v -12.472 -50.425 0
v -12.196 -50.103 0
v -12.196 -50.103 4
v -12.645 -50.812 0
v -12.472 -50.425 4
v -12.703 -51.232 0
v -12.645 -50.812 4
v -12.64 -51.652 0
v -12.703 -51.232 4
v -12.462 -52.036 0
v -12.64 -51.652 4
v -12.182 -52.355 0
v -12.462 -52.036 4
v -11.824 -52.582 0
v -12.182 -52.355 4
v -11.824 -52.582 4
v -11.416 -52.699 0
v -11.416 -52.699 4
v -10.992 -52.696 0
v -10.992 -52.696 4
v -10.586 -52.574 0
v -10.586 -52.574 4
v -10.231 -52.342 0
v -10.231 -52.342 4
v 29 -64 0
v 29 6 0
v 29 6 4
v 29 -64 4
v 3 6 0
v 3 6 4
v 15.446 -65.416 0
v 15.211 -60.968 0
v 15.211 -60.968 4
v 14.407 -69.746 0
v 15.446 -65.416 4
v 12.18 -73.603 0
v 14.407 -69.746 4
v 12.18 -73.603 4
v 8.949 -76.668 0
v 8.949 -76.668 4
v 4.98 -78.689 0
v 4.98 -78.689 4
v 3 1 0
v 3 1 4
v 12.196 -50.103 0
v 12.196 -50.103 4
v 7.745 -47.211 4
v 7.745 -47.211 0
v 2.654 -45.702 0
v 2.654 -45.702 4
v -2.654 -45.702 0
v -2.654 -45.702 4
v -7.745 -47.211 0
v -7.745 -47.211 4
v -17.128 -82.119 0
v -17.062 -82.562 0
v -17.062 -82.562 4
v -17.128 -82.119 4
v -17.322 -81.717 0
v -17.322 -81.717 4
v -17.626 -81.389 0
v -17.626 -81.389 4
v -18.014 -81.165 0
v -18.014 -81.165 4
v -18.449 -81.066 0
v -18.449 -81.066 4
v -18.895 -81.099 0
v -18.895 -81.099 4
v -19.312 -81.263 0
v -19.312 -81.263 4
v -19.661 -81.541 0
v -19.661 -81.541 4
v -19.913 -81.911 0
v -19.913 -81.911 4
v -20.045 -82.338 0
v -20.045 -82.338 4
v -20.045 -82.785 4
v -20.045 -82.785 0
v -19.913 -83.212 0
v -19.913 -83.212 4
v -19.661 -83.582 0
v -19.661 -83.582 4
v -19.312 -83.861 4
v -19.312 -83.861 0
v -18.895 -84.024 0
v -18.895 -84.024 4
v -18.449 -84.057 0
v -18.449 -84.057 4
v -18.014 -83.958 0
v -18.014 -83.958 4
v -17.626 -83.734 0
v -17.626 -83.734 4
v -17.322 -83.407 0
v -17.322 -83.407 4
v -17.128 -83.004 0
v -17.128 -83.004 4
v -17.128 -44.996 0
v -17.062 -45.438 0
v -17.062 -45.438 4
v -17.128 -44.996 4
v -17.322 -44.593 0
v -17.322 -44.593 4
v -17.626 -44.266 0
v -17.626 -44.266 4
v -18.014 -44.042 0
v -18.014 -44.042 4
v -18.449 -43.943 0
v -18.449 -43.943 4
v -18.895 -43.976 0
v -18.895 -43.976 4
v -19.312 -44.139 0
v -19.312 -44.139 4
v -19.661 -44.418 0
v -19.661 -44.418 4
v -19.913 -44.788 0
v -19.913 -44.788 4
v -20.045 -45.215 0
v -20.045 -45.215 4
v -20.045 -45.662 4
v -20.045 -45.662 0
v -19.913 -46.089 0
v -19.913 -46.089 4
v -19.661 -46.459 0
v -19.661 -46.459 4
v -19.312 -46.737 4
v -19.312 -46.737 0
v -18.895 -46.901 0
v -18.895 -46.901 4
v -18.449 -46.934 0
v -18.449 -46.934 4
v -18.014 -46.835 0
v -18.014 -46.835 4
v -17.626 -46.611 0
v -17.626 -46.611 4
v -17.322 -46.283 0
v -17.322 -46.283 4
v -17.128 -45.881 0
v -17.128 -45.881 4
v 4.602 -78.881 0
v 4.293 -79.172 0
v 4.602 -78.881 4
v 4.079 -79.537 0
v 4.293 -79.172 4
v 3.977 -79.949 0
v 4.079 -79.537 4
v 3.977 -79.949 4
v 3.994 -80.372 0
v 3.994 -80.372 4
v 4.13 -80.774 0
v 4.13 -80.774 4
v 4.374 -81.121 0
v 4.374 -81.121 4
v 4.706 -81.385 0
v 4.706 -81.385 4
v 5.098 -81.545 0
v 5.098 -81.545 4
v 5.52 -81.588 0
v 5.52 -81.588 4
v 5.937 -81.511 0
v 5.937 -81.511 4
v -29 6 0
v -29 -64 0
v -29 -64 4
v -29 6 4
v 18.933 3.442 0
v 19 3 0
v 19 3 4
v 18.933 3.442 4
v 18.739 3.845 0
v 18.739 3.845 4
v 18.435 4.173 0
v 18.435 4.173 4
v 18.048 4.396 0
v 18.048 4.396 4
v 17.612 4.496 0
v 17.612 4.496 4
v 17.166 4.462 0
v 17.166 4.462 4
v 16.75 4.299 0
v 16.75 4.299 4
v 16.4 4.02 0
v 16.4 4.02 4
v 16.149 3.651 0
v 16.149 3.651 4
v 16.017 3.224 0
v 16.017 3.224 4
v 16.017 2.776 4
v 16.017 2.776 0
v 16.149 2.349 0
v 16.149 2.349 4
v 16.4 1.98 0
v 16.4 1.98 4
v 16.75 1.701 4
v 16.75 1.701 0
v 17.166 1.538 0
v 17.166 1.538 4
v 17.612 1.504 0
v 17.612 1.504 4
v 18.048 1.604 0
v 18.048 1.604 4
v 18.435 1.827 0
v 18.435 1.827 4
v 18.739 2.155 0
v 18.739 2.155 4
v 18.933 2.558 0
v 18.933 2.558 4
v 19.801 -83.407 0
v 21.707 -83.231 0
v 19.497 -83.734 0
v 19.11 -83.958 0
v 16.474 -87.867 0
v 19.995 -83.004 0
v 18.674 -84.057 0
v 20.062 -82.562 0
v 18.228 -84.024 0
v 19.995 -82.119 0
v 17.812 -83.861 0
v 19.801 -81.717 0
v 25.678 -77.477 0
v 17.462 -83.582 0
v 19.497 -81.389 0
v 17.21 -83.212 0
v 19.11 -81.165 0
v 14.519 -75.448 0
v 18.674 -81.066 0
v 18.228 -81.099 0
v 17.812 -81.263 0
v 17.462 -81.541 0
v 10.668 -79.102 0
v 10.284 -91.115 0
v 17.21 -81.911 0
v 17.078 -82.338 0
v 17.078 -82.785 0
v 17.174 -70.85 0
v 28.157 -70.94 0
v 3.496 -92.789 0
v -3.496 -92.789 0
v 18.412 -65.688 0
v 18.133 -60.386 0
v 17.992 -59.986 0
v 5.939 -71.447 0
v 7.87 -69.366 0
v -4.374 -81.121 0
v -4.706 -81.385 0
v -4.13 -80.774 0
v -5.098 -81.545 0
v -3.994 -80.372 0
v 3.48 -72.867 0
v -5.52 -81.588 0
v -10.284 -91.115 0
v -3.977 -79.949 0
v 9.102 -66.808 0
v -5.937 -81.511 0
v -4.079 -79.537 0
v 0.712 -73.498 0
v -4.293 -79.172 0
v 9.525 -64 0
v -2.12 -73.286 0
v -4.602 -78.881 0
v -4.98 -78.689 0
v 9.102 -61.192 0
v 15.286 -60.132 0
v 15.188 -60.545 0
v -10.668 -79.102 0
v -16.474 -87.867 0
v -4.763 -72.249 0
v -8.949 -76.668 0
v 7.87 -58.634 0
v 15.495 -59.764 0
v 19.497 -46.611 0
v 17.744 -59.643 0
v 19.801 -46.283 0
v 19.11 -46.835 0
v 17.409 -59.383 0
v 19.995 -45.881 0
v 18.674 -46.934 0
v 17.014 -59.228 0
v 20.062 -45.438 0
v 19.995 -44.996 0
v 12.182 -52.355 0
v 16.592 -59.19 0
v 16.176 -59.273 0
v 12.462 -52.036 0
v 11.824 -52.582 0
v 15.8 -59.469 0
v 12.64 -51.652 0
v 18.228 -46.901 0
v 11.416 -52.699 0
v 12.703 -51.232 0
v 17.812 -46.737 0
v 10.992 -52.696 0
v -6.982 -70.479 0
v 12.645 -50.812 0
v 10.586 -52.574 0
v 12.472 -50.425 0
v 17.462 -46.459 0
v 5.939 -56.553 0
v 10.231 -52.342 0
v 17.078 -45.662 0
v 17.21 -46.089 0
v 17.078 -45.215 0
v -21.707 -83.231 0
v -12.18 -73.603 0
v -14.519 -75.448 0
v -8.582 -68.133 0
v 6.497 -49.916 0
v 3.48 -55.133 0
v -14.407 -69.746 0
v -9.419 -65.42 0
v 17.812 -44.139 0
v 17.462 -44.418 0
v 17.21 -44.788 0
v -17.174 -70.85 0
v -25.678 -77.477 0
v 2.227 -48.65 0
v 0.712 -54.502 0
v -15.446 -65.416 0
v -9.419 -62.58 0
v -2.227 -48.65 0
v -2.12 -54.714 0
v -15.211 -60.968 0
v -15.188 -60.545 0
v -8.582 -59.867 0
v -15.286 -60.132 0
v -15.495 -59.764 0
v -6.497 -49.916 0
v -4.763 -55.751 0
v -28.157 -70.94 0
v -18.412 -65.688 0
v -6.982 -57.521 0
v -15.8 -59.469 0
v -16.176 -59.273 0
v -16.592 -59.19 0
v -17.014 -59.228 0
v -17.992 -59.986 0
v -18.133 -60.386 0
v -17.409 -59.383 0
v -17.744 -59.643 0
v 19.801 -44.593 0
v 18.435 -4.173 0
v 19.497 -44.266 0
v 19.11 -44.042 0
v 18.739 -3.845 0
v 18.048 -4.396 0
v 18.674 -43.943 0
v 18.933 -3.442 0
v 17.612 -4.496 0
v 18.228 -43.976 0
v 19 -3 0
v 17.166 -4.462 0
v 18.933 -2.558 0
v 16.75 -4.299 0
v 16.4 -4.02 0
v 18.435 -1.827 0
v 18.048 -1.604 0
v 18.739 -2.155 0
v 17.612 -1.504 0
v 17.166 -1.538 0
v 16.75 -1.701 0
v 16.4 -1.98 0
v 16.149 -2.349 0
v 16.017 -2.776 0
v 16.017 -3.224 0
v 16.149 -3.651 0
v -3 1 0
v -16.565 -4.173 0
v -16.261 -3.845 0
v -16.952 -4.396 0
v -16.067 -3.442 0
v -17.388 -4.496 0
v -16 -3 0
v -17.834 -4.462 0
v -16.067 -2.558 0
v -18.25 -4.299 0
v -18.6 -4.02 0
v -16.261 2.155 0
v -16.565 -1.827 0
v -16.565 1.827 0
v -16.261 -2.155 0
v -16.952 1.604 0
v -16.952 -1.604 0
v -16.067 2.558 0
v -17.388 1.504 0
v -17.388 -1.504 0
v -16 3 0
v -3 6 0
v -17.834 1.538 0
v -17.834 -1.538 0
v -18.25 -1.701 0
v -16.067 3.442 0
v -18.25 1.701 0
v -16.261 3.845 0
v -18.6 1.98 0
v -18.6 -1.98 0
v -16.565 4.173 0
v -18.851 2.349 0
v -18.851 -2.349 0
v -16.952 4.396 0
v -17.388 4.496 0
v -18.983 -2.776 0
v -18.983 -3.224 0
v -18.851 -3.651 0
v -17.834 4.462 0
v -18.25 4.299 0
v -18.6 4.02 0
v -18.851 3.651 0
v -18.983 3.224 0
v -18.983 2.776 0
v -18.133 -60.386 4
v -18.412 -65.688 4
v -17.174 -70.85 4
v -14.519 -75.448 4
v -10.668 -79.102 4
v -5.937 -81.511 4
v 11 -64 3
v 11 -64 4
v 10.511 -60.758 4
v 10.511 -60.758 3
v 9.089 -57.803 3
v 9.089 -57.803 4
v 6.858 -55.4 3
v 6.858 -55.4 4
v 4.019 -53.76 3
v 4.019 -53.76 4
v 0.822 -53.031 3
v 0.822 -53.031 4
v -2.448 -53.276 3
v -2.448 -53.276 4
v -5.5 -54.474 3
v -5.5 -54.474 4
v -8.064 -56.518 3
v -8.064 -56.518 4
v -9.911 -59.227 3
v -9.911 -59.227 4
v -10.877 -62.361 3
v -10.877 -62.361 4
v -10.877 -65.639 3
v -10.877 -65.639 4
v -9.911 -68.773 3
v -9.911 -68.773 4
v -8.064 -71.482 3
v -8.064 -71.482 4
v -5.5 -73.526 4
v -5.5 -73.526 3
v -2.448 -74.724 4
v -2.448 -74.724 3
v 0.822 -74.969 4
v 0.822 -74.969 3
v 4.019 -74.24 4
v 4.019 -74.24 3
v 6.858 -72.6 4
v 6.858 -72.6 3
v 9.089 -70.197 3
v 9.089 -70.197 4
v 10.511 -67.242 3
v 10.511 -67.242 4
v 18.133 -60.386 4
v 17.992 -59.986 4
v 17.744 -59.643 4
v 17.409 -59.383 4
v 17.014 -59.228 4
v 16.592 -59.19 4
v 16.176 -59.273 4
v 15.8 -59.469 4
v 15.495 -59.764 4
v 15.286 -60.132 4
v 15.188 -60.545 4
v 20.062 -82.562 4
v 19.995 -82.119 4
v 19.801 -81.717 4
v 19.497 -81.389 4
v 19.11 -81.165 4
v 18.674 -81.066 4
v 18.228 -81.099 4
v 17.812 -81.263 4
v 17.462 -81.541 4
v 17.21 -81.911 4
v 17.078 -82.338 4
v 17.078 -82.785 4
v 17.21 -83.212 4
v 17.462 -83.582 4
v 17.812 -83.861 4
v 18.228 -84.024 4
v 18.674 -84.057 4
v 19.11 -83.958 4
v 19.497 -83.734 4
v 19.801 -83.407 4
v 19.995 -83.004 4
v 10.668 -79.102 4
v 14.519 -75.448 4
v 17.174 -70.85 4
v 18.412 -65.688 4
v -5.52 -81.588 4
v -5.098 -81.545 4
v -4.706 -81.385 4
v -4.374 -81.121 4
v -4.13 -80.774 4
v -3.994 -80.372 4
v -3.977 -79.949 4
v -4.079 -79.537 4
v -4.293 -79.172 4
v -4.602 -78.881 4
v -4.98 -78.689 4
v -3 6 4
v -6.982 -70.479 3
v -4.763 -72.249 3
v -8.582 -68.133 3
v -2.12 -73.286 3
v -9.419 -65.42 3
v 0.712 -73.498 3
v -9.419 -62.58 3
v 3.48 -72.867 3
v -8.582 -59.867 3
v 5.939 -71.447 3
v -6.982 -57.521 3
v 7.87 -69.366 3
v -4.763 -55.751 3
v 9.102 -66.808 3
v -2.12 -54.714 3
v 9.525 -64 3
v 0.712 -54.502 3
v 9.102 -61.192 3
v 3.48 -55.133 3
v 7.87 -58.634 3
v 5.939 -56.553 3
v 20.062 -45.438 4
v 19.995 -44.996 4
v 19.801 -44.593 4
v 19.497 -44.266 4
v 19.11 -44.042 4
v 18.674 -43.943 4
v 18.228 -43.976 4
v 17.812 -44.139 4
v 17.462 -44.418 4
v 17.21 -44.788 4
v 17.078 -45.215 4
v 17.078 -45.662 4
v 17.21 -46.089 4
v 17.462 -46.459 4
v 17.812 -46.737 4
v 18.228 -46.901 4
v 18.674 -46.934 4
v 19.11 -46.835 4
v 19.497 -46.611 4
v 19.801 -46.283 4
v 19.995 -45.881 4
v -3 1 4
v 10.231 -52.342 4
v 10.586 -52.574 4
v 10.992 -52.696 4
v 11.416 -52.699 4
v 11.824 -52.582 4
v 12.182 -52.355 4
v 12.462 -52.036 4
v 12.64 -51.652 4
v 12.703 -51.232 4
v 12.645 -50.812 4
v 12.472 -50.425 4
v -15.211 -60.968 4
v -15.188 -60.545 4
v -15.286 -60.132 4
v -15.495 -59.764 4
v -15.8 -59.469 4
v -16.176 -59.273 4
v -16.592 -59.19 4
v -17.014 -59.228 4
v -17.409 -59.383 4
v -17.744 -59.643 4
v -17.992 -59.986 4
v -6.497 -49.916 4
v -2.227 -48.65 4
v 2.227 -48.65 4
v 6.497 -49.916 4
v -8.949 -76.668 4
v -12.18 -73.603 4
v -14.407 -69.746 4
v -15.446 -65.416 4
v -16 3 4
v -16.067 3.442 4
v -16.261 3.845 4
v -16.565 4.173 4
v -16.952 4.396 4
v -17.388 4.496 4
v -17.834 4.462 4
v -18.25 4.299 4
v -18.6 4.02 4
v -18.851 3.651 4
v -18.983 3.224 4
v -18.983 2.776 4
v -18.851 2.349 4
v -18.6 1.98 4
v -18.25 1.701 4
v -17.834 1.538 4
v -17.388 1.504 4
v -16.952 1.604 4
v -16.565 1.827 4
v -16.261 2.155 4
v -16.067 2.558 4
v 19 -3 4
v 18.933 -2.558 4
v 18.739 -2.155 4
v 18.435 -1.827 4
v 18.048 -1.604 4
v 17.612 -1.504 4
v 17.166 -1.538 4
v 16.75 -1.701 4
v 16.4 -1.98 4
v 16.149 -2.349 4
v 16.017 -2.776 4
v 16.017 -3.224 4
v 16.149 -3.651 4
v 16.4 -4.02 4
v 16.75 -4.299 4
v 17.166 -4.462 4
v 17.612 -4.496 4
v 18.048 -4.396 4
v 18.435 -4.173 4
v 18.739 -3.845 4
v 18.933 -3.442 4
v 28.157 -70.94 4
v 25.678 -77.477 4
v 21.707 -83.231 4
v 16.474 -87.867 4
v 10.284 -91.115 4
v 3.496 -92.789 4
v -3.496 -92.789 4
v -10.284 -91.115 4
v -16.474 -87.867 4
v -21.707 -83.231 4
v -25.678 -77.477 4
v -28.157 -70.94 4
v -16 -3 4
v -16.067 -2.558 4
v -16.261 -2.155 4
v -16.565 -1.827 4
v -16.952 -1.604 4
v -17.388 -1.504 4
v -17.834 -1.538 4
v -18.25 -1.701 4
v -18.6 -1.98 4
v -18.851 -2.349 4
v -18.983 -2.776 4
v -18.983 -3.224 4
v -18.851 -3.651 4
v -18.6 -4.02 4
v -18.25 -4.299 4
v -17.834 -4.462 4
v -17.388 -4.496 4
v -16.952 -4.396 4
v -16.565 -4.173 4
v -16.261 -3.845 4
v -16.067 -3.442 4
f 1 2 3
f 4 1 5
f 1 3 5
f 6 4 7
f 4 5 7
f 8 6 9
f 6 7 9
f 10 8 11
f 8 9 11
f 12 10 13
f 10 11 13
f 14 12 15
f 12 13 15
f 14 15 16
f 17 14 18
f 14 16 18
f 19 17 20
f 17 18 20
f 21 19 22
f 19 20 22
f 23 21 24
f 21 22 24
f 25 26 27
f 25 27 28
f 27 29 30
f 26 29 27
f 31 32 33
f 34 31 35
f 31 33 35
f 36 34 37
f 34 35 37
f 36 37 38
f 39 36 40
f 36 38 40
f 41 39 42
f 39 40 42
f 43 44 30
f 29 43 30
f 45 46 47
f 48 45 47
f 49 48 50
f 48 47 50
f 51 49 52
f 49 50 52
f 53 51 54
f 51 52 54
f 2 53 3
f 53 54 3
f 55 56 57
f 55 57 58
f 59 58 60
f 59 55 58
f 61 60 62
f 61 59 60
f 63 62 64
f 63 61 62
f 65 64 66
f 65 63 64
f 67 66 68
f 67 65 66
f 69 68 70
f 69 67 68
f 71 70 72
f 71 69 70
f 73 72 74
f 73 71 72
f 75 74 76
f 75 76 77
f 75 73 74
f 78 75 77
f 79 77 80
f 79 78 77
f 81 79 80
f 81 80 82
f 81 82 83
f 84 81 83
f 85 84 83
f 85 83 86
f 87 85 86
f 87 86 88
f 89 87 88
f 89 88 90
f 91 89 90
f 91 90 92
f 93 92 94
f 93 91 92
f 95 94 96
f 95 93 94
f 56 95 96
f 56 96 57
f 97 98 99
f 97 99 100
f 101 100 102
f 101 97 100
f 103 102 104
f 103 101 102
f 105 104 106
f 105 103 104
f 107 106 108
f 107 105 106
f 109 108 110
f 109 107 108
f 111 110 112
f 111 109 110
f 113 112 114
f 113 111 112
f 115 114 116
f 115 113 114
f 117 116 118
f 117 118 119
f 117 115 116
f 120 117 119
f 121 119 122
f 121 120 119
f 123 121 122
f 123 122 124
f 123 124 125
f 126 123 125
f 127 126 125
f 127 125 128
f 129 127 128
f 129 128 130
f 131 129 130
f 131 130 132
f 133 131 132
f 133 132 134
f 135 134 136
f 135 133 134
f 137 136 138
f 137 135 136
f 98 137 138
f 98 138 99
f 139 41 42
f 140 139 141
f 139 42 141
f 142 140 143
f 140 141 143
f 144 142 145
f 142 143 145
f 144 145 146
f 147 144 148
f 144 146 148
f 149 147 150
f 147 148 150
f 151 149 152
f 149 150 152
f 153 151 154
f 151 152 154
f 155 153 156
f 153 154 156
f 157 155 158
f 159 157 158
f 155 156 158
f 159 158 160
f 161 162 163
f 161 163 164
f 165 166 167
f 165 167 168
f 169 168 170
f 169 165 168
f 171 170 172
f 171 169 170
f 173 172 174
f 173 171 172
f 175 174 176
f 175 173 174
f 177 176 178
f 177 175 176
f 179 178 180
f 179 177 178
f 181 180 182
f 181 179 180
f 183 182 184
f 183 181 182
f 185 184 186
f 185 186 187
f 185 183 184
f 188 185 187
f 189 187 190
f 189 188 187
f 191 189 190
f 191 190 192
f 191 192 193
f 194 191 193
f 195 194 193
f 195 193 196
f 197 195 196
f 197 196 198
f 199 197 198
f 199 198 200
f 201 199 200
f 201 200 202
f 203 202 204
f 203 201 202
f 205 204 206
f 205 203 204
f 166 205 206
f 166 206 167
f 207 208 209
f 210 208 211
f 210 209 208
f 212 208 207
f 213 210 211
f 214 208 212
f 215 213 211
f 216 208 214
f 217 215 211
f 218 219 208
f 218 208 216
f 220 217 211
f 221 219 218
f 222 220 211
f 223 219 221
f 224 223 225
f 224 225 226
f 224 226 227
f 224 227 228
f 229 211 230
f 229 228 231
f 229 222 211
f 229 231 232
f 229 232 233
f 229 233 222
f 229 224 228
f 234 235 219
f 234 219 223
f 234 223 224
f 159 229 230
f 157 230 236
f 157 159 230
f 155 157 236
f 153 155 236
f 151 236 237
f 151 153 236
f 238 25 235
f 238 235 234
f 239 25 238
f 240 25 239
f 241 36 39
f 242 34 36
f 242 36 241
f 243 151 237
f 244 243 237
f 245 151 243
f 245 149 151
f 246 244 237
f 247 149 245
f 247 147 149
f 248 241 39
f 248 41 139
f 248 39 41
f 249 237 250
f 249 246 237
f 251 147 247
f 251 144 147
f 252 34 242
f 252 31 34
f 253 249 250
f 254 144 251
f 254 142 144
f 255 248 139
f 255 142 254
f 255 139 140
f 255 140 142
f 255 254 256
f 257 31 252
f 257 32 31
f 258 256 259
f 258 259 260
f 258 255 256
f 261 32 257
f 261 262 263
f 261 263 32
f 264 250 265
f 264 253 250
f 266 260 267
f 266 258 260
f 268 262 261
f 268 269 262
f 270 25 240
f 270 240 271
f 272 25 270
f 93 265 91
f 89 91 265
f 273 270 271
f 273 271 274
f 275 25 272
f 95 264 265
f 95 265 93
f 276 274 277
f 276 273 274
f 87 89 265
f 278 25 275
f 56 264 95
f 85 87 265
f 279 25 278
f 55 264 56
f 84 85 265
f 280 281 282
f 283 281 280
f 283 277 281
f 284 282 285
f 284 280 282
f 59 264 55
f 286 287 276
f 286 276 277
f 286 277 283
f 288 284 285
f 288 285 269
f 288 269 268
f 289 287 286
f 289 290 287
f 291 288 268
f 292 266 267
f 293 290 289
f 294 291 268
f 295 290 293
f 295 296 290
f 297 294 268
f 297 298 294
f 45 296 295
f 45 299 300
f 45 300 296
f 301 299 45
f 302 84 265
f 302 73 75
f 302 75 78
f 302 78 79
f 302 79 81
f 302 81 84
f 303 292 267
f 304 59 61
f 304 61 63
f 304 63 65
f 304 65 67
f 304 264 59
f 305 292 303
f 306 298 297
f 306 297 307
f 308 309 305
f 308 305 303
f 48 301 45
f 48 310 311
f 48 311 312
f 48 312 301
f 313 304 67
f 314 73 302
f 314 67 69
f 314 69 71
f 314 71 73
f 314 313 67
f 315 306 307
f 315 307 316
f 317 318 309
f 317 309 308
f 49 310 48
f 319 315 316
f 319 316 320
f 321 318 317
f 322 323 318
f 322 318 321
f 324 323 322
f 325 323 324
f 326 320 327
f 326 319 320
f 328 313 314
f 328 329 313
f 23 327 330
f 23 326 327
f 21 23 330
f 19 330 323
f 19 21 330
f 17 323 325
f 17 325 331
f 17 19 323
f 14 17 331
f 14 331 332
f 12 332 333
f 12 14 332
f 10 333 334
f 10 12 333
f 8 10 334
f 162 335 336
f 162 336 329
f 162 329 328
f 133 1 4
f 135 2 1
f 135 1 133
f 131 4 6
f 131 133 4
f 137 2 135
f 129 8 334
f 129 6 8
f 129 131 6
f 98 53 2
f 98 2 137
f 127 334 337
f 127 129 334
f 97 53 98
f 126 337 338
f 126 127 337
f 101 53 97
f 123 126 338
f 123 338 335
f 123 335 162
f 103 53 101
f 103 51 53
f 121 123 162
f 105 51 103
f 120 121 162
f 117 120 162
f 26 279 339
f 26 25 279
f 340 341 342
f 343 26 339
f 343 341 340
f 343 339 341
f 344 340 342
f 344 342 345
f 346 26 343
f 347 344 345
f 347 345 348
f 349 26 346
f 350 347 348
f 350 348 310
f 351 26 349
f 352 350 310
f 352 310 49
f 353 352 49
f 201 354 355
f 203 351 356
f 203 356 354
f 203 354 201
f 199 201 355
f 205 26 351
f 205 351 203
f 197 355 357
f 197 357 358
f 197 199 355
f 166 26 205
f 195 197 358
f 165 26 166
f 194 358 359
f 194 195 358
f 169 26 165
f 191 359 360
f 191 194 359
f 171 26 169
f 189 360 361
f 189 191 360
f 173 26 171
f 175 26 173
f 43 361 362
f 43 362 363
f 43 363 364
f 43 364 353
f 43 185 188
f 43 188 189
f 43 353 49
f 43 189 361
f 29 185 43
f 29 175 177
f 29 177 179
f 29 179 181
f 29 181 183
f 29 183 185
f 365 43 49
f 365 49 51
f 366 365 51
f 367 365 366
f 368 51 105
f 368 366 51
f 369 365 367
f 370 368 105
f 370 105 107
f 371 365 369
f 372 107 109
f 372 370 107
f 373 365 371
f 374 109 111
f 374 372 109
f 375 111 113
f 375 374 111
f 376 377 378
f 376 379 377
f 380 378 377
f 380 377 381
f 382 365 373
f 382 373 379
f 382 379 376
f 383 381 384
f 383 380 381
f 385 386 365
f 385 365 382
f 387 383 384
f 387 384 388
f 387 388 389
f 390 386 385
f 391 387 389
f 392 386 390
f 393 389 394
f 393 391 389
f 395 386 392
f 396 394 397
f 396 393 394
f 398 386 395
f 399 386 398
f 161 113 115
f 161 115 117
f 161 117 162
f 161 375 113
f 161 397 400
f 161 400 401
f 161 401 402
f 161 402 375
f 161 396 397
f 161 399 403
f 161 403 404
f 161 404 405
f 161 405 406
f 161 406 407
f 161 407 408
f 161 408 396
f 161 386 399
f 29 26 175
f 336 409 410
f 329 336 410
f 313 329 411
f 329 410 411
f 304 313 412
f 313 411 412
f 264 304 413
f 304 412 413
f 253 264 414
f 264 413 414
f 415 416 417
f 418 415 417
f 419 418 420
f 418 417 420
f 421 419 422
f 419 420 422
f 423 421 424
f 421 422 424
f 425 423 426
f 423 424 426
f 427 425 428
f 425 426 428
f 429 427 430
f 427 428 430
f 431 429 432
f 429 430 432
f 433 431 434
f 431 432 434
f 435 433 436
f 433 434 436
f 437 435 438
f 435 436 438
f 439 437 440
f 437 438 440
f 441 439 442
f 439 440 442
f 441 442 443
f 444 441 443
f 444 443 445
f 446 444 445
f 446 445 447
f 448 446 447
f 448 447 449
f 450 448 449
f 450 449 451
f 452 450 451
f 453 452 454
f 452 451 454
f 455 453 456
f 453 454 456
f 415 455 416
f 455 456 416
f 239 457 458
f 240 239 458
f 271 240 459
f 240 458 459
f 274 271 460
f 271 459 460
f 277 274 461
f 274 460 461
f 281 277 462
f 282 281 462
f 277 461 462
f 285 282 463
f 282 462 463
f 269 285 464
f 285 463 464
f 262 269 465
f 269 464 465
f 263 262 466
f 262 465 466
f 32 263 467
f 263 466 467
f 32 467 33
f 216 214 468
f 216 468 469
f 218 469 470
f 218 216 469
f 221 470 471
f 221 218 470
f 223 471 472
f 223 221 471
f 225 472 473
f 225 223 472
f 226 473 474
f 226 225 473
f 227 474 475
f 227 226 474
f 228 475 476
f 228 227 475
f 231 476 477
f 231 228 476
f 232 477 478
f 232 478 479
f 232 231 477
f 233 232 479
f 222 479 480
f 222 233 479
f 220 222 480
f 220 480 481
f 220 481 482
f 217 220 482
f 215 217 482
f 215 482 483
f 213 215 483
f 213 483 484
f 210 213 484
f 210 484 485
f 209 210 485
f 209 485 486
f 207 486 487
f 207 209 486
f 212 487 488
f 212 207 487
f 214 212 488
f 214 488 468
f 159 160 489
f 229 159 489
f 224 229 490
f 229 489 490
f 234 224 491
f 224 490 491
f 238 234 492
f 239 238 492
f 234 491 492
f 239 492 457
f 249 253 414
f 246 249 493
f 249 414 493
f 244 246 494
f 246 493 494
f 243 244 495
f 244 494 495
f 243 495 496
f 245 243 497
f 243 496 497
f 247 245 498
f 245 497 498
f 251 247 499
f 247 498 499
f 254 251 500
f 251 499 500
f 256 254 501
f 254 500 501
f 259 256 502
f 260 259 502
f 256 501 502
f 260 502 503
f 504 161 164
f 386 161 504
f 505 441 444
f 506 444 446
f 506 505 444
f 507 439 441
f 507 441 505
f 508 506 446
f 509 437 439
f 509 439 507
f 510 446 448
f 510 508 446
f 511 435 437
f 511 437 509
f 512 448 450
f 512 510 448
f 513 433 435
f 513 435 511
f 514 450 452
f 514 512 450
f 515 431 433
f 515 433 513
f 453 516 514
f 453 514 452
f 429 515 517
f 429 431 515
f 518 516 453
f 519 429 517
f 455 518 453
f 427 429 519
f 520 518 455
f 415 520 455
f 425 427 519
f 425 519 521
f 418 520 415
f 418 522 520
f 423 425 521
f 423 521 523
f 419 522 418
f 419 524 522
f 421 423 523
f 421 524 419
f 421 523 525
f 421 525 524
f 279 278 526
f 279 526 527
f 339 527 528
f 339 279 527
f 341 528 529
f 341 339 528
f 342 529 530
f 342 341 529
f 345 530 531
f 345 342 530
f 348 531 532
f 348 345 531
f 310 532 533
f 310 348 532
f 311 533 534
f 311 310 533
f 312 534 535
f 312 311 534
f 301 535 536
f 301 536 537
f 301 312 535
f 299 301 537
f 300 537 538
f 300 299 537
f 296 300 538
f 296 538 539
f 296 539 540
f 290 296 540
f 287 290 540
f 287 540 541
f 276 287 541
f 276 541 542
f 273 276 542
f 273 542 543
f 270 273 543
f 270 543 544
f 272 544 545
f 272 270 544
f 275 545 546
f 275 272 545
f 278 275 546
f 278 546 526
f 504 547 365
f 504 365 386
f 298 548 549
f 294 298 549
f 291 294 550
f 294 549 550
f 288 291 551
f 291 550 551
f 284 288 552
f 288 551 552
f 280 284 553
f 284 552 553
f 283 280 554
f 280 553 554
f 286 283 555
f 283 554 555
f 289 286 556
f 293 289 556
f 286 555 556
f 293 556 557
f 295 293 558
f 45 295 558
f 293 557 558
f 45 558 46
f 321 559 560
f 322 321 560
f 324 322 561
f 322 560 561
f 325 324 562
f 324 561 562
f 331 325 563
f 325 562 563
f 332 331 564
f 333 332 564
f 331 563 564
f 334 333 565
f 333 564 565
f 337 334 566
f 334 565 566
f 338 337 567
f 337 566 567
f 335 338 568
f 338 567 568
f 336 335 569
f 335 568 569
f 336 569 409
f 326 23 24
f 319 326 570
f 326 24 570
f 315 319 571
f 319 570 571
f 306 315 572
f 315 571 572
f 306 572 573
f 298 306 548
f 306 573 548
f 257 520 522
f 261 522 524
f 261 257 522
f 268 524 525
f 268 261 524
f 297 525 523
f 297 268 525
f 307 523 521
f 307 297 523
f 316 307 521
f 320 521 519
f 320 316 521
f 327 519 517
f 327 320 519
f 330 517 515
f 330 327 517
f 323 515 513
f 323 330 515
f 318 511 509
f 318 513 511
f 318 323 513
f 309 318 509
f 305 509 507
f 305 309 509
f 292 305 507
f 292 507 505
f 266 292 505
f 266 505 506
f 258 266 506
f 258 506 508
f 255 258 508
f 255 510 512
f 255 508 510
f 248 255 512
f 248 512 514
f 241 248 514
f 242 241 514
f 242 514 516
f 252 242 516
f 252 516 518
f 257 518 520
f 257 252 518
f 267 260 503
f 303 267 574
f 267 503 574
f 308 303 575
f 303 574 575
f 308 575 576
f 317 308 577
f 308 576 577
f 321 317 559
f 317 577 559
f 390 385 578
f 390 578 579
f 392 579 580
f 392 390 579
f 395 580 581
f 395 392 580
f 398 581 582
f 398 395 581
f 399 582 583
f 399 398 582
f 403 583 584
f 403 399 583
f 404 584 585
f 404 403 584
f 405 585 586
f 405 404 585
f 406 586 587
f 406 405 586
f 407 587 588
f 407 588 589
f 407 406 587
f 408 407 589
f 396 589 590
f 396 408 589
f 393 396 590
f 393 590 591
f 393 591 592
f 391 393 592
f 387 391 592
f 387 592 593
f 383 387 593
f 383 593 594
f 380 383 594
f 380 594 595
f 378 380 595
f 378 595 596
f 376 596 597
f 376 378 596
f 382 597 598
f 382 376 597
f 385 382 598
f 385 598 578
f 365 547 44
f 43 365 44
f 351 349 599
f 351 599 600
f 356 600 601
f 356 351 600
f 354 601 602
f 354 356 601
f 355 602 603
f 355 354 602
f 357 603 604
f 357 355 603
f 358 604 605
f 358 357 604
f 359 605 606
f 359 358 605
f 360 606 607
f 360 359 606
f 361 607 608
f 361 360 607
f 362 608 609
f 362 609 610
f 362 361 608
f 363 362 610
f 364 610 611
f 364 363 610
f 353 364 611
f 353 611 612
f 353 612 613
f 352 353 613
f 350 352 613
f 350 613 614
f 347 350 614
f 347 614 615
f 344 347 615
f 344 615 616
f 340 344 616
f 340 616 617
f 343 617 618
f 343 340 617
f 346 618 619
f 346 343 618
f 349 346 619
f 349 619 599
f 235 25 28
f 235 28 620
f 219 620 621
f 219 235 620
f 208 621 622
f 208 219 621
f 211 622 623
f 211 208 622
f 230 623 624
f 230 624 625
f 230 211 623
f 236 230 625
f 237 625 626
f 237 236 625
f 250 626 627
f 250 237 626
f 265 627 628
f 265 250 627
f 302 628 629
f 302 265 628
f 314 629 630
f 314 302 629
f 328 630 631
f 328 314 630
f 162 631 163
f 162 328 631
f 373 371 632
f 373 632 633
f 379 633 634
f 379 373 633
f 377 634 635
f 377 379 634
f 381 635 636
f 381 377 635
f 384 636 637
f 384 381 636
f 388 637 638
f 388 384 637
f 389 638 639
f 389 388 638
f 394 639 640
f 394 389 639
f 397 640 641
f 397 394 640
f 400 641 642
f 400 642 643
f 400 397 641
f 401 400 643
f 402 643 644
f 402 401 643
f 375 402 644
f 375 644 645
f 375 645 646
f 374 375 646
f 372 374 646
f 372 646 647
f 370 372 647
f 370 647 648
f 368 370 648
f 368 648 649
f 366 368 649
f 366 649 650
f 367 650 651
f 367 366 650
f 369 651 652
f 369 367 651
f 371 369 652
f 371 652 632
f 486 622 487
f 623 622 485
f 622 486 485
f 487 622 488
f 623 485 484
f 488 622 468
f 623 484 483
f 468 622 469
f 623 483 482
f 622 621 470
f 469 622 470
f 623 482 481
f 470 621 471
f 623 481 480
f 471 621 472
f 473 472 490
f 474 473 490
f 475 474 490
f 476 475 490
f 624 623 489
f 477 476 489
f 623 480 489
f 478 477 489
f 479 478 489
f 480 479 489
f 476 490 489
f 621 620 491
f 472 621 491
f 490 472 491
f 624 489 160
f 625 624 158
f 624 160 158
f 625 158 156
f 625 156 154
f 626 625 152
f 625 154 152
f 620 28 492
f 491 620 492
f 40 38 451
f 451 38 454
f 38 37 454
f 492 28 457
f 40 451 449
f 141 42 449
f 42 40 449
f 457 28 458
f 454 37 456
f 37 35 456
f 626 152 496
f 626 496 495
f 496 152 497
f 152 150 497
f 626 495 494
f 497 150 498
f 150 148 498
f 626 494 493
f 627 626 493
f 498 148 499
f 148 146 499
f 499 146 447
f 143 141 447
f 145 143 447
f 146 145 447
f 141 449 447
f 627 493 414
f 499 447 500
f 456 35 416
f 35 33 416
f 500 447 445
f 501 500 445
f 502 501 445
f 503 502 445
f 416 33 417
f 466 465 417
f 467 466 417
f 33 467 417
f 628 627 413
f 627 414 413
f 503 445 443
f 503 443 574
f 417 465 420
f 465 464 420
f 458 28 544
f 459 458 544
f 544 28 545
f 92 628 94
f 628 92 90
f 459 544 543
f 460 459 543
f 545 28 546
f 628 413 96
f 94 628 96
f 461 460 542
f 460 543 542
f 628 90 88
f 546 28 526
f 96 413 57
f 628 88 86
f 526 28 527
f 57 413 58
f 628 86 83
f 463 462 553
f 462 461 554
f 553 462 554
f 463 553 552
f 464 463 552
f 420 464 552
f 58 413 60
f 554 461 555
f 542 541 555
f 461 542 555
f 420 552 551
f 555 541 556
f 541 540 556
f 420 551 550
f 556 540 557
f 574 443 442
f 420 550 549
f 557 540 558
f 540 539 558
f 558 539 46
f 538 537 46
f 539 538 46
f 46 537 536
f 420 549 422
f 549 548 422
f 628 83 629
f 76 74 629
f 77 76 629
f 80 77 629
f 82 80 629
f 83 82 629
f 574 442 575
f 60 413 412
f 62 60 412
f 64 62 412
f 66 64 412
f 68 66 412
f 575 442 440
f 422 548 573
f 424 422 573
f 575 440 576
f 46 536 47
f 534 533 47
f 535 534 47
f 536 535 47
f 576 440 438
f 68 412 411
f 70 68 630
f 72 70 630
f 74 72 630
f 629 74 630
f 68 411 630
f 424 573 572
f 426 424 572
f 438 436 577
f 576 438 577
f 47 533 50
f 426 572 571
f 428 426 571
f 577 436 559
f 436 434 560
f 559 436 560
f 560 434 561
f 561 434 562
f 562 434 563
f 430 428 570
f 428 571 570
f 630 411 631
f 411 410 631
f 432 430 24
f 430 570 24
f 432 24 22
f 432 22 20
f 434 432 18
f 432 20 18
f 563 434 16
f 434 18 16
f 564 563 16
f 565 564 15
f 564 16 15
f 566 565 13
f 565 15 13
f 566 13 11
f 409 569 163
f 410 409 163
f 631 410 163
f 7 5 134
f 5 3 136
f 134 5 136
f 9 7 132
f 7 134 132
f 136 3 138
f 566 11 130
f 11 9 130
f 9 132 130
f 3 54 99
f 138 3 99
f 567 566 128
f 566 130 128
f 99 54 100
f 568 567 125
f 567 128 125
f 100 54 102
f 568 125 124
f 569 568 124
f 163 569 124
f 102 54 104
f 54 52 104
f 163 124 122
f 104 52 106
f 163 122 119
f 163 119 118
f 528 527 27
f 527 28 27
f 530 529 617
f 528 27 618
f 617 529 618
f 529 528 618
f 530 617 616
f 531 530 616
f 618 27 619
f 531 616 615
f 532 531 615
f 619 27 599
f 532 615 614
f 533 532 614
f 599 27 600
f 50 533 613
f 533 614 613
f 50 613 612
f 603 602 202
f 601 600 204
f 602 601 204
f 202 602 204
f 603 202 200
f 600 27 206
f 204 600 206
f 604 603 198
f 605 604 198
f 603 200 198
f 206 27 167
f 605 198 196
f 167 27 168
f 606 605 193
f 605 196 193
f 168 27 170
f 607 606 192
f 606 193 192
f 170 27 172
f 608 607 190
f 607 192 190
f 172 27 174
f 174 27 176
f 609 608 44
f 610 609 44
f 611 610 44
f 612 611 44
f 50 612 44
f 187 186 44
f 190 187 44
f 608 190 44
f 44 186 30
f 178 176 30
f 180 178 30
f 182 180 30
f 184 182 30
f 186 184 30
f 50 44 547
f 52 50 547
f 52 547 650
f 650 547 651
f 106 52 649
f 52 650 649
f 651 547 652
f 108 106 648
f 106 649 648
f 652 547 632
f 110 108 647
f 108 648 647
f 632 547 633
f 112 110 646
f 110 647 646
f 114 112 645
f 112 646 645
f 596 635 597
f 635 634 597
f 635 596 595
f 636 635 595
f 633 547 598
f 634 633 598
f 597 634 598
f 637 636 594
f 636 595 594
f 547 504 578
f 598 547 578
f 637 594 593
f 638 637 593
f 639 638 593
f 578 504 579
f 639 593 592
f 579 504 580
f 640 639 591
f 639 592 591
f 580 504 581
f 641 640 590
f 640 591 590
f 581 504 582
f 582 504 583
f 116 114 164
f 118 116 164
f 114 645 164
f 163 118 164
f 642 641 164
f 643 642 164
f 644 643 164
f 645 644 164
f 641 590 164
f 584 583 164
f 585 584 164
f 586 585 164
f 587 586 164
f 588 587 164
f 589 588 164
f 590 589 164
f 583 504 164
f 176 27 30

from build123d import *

# Parameters (mm, degrees)
SKETCH_1_R          = 9.525
SKETCH_1_R_2        = 1.5
EXTRUDE_1_DEPTH     = 4
SKETCH_2_W          = 6
SKETCH_2_H          = 5
CUT_EXTRUDE_1_DEPTH = 98.49871794
CUT_EXTRUDE_2_DEPTH = 10
SKETCH_4_R          = 11
CUT_EXTRUDE_3_DEPTH = 1


with BuildPart() as part:
    # 草图1 → 凸台-拉伸1 (new body)
    with BuildSketch(Plane.XY):
        with BuildLine():
            Line((-29, 6), (29, 6))
            Line((29, 6), (29, -64))
            ThreePointArc((29, -64), (0, -93), (-29, -64))
            Line((-29, -64), (-29, 6))
        make_face()
        with Locations((0, -64)):
            Circle(SKETCH_1_R, mode=Mode.SUBTRACT)
        with Locations((-17.5, 3)):
            Circle(SKETCH_1_R_2, mode=Mode.SUBTRACT)
        with Locations((17.5, 3)):
            Circle(SKETCH_1_R_2, mode=Mode.SUBTRACT)
        with Locations((18.561553006, -82.561553006)):
            Circle(SKETCH_1_R_2, mode=Mode.SUBTRACT)
        with Locations((-18.561553006, -82.561553006)):
            Circle(SKETCH_1_R_2, mode=Mode.SUBTRACT)
        with Locations((-18.561553006, -45.438446994)):
            Circle(SKETCH_1_R_2, mode=Mode.SUBTRACT)
        with Locations((18.561553006, -45.438446994)):
            Circle(SKETCH_1_R_2, mode=Mode.SUBTRACT)
        with Locations((-17.5, -3)):
            Circle(SKETCH_1_R_2, mode=Mode.SUBTRACT)
        with Locations((17.5, -3)):
            Circle(SKETCH_1_R_2, mode=Mode.SUBTRACT)
    extrude(amount=EXTRUDE_1_DEPTH)

    # 草图2 → 切除-拉伸1 (cut, through all)
    with BuildSketch(Plane.XY.offset(4)):
        with Locations((0, 3.5)):
            Rectangle(SKETCH_2_W, SKETCH_2_H)
    extrude(amount=-CUT_EXTRUDE_1_DEPTH, mode=Mode.SUBTRACT)

    # 草图3 → 切除-拉伸2 (cut)
    with BuildSketch(Plane.XY.offset(4)):
        with BuildLine():
            ThreePointArc((12.196146044, -50.10328221), (0, -45.510415266), (-12.196146044, -50.10328221))
            ThreePointArc((-12.196146044, -50.10328221), (-12.333149971, -52.20541334), (-10.231018841, -52.342417267))
            ThreePointArc((-10.231018841, -52.342417267), (0, -48.489584734), (10.231018841, -52.342417267))
            ThreePointArc((10.231018841, -52.342417267), (12.333149971, -52.20541334), (12.196146044, -50.10328221))
        make_face()
        with BuildLine():
            ThreePointArc((5.936837613, -81.510531197), (16.012450085, -73.244792367), (18.132983657, -60.386186592))
            ThreePointArc((18.132983657, -60.386186592), (16.38098666, -59.216472147), (15.211272214, -60.968469144))
            ThreePointArc((15.211272214, -60.968469144), (13.432413643, -71.755207633), (4.980253373, -78.68911359))
            ThreePointArc((4.980253373, -78.68911359), (4.047836689, -80.578114513), (5.936837613, -81.510531197))
        make_face()
        with BuildLine():
            ThreePointArc((-18.132983657, -60.386186592), (-16.012450085, -73.244792367), (-5.936837613, -81.510531197))
            ThreePointArc((-5.936837613, -81.510531197), (-4.047836689, -80.578114513), (-4.980253373, -78.68911359))
            ThreePointArc((-4.980253373, -78.68911359), (-13.432413643, -71.755207633), (-15.211272214, -60.968469144))
            ThreePointArc((-15.211272214, -60.968469144), (-16.38098666, -59.216472147), (-18.132983657, -60.386186592))
        make_face()
    extrude(amount=-CUT_EXTRUDE_2_DEPTH, mode=Mode.SUBTRACT)

    # 草图4 → 切除-拉伸3 (cut)
    with BuildSketch(Plane.XY.offset(4)):
        with Locations((0, -64)):
            Circle(SKETCH_4_R)
    extrude(amount=-CUT_EXTRUDE_3_DEPTH, mode=Mode.SUBTRACT)


solid = part.part
